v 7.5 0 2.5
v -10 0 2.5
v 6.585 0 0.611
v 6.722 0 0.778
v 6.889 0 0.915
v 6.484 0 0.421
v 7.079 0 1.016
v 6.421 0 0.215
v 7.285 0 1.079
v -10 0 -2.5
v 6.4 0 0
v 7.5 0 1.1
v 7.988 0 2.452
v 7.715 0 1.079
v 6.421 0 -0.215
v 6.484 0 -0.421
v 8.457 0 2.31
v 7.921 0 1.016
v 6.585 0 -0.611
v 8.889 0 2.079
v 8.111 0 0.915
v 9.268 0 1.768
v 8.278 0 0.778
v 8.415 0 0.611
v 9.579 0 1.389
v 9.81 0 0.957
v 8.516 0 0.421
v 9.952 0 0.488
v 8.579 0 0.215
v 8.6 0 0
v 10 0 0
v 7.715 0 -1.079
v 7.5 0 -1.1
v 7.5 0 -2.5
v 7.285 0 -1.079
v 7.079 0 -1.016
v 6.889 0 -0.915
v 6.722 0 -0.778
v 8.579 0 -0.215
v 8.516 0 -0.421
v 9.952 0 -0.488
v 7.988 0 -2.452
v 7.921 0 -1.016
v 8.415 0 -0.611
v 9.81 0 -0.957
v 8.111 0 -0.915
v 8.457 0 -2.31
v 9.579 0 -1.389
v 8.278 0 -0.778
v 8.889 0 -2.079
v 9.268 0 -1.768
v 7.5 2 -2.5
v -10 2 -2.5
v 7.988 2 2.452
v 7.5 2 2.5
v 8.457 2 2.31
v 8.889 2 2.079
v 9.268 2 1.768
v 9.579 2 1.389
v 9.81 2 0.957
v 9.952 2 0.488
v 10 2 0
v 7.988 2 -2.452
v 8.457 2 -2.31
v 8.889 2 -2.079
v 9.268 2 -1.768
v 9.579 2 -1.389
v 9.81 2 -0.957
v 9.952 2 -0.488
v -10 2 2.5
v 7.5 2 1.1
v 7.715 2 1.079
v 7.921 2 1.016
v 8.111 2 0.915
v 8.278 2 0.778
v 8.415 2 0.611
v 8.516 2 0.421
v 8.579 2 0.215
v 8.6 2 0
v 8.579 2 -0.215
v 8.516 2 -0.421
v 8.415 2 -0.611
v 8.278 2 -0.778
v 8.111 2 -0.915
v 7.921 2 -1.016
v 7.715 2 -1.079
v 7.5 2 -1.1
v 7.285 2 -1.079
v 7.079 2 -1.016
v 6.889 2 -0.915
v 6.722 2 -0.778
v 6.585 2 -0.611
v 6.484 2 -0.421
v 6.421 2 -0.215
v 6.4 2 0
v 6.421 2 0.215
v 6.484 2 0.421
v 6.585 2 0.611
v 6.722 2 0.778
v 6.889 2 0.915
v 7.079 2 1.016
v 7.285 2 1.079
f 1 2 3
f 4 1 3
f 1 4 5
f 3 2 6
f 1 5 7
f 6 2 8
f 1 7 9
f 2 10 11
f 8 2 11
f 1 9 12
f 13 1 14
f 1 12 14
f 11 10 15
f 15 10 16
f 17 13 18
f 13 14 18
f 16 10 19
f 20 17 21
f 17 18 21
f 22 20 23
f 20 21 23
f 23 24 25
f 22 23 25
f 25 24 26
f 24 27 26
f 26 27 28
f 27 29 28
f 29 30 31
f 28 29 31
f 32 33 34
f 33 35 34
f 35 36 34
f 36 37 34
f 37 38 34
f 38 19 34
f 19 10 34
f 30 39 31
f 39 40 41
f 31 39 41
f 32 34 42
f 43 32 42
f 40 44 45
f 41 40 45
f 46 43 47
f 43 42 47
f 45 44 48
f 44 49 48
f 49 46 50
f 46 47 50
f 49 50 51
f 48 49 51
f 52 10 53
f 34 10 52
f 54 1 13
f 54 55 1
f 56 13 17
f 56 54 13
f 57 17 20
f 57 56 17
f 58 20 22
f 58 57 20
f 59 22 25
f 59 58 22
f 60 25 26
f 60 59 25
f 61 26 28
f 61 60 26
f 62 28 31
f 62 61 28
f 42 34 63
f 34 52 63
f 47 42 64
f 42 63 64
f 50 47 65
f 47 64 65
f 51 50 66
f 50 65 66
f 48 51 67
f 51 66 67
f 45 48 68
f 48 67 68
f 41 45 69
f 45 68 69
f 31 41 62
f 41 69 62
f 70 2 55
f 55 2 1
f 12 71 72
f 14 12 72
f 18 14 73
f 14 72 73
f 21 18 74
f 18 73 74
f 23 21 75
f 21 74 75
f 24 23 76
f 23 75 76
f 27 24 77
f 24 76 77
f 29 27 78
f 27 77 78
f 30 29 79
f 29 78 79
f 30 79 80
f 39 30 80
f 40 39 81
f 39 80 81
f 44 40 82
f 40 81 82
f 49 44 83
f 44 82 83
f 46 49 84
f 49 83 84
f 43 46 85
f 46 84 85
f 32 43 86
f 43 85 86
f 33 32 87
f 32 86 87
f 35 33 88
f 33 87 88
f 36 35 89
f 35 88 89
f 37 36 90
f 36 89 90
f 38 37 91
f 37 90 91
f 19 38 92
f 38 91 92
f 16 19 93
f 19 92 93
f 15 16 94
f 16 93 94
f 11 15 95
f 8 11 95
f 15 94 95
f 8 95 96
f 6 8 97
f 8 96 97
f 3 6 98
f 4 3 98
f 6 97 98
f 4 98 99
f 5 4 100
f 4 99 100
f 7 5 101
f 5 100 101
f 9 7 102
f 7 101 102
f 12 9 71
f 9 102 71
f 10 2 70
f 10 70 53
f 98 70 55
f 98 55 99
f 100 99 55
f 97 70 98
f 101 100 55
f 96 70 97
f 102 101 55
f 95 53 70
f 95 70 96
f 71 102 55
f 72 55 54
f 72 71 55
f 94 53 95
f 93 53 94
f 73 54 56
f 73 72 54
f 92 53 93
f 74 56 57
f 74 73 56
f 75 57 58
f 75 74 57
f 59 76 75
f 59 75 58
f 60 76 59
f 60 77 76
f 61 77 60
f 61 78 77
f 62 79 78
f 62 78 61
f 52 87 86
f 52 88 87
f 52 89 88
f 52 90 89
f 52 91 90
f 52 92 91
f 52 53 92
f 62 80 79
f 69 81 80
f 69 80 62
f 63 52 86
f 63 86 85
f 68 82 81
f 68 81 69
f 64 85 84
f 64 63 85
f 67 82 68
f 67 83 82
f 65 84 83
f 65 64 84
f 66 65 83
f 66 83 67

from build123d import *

# Parameters (mm, degrees)
SKETCH1_W           = 20
SKETCH1_H           = 5
BOSS_EXTRUDE1_DEPTH = 2
SKETCH2_R           = 1.1
CUT_EXTRUDE1_DEPTH  = 2
FILLET1_R           = 2.5


with BuildPart() as part:
    # Sketch1 → Boss-Extrude1 (new body)
    with BuildSketch(Plane(origin=(0, 0, 0), x_dir=(1, 0, 0), z_dir=(0, 1, 0))):
        Rectangle(SKETCH1_W, SKETCH1_H)
    extrude(amount=BOSS_EXTRUDE1_DEPTH)

    # Sketch2 → Cut-Extrude1 (cut)
    with BuildSketch(Plane(origin=(0, 2, 0), x_dir=(1, 0, 0), z_dir=(0, 1, 0))):
        with Locations(Location((7.5, 0, 0), (0, 0, 270))):
            Circle(SKETCH2_R)
    extrude(amount=-CUT_EXTRUDE1_DEPTH, mode=Mode.SUBTRACT)

    # Fillet1
    fillet1_edges = [part.edges().sort_by_distance(p)[0] for p in [
        (10, 1, 2.5),
        (10, 1, -2.5),
    ]]
    fillet(fillet1_edges, radius=FILLET1_R - 0.0001)  # a hair under: the kernel refuses the full size


solid = part.part
